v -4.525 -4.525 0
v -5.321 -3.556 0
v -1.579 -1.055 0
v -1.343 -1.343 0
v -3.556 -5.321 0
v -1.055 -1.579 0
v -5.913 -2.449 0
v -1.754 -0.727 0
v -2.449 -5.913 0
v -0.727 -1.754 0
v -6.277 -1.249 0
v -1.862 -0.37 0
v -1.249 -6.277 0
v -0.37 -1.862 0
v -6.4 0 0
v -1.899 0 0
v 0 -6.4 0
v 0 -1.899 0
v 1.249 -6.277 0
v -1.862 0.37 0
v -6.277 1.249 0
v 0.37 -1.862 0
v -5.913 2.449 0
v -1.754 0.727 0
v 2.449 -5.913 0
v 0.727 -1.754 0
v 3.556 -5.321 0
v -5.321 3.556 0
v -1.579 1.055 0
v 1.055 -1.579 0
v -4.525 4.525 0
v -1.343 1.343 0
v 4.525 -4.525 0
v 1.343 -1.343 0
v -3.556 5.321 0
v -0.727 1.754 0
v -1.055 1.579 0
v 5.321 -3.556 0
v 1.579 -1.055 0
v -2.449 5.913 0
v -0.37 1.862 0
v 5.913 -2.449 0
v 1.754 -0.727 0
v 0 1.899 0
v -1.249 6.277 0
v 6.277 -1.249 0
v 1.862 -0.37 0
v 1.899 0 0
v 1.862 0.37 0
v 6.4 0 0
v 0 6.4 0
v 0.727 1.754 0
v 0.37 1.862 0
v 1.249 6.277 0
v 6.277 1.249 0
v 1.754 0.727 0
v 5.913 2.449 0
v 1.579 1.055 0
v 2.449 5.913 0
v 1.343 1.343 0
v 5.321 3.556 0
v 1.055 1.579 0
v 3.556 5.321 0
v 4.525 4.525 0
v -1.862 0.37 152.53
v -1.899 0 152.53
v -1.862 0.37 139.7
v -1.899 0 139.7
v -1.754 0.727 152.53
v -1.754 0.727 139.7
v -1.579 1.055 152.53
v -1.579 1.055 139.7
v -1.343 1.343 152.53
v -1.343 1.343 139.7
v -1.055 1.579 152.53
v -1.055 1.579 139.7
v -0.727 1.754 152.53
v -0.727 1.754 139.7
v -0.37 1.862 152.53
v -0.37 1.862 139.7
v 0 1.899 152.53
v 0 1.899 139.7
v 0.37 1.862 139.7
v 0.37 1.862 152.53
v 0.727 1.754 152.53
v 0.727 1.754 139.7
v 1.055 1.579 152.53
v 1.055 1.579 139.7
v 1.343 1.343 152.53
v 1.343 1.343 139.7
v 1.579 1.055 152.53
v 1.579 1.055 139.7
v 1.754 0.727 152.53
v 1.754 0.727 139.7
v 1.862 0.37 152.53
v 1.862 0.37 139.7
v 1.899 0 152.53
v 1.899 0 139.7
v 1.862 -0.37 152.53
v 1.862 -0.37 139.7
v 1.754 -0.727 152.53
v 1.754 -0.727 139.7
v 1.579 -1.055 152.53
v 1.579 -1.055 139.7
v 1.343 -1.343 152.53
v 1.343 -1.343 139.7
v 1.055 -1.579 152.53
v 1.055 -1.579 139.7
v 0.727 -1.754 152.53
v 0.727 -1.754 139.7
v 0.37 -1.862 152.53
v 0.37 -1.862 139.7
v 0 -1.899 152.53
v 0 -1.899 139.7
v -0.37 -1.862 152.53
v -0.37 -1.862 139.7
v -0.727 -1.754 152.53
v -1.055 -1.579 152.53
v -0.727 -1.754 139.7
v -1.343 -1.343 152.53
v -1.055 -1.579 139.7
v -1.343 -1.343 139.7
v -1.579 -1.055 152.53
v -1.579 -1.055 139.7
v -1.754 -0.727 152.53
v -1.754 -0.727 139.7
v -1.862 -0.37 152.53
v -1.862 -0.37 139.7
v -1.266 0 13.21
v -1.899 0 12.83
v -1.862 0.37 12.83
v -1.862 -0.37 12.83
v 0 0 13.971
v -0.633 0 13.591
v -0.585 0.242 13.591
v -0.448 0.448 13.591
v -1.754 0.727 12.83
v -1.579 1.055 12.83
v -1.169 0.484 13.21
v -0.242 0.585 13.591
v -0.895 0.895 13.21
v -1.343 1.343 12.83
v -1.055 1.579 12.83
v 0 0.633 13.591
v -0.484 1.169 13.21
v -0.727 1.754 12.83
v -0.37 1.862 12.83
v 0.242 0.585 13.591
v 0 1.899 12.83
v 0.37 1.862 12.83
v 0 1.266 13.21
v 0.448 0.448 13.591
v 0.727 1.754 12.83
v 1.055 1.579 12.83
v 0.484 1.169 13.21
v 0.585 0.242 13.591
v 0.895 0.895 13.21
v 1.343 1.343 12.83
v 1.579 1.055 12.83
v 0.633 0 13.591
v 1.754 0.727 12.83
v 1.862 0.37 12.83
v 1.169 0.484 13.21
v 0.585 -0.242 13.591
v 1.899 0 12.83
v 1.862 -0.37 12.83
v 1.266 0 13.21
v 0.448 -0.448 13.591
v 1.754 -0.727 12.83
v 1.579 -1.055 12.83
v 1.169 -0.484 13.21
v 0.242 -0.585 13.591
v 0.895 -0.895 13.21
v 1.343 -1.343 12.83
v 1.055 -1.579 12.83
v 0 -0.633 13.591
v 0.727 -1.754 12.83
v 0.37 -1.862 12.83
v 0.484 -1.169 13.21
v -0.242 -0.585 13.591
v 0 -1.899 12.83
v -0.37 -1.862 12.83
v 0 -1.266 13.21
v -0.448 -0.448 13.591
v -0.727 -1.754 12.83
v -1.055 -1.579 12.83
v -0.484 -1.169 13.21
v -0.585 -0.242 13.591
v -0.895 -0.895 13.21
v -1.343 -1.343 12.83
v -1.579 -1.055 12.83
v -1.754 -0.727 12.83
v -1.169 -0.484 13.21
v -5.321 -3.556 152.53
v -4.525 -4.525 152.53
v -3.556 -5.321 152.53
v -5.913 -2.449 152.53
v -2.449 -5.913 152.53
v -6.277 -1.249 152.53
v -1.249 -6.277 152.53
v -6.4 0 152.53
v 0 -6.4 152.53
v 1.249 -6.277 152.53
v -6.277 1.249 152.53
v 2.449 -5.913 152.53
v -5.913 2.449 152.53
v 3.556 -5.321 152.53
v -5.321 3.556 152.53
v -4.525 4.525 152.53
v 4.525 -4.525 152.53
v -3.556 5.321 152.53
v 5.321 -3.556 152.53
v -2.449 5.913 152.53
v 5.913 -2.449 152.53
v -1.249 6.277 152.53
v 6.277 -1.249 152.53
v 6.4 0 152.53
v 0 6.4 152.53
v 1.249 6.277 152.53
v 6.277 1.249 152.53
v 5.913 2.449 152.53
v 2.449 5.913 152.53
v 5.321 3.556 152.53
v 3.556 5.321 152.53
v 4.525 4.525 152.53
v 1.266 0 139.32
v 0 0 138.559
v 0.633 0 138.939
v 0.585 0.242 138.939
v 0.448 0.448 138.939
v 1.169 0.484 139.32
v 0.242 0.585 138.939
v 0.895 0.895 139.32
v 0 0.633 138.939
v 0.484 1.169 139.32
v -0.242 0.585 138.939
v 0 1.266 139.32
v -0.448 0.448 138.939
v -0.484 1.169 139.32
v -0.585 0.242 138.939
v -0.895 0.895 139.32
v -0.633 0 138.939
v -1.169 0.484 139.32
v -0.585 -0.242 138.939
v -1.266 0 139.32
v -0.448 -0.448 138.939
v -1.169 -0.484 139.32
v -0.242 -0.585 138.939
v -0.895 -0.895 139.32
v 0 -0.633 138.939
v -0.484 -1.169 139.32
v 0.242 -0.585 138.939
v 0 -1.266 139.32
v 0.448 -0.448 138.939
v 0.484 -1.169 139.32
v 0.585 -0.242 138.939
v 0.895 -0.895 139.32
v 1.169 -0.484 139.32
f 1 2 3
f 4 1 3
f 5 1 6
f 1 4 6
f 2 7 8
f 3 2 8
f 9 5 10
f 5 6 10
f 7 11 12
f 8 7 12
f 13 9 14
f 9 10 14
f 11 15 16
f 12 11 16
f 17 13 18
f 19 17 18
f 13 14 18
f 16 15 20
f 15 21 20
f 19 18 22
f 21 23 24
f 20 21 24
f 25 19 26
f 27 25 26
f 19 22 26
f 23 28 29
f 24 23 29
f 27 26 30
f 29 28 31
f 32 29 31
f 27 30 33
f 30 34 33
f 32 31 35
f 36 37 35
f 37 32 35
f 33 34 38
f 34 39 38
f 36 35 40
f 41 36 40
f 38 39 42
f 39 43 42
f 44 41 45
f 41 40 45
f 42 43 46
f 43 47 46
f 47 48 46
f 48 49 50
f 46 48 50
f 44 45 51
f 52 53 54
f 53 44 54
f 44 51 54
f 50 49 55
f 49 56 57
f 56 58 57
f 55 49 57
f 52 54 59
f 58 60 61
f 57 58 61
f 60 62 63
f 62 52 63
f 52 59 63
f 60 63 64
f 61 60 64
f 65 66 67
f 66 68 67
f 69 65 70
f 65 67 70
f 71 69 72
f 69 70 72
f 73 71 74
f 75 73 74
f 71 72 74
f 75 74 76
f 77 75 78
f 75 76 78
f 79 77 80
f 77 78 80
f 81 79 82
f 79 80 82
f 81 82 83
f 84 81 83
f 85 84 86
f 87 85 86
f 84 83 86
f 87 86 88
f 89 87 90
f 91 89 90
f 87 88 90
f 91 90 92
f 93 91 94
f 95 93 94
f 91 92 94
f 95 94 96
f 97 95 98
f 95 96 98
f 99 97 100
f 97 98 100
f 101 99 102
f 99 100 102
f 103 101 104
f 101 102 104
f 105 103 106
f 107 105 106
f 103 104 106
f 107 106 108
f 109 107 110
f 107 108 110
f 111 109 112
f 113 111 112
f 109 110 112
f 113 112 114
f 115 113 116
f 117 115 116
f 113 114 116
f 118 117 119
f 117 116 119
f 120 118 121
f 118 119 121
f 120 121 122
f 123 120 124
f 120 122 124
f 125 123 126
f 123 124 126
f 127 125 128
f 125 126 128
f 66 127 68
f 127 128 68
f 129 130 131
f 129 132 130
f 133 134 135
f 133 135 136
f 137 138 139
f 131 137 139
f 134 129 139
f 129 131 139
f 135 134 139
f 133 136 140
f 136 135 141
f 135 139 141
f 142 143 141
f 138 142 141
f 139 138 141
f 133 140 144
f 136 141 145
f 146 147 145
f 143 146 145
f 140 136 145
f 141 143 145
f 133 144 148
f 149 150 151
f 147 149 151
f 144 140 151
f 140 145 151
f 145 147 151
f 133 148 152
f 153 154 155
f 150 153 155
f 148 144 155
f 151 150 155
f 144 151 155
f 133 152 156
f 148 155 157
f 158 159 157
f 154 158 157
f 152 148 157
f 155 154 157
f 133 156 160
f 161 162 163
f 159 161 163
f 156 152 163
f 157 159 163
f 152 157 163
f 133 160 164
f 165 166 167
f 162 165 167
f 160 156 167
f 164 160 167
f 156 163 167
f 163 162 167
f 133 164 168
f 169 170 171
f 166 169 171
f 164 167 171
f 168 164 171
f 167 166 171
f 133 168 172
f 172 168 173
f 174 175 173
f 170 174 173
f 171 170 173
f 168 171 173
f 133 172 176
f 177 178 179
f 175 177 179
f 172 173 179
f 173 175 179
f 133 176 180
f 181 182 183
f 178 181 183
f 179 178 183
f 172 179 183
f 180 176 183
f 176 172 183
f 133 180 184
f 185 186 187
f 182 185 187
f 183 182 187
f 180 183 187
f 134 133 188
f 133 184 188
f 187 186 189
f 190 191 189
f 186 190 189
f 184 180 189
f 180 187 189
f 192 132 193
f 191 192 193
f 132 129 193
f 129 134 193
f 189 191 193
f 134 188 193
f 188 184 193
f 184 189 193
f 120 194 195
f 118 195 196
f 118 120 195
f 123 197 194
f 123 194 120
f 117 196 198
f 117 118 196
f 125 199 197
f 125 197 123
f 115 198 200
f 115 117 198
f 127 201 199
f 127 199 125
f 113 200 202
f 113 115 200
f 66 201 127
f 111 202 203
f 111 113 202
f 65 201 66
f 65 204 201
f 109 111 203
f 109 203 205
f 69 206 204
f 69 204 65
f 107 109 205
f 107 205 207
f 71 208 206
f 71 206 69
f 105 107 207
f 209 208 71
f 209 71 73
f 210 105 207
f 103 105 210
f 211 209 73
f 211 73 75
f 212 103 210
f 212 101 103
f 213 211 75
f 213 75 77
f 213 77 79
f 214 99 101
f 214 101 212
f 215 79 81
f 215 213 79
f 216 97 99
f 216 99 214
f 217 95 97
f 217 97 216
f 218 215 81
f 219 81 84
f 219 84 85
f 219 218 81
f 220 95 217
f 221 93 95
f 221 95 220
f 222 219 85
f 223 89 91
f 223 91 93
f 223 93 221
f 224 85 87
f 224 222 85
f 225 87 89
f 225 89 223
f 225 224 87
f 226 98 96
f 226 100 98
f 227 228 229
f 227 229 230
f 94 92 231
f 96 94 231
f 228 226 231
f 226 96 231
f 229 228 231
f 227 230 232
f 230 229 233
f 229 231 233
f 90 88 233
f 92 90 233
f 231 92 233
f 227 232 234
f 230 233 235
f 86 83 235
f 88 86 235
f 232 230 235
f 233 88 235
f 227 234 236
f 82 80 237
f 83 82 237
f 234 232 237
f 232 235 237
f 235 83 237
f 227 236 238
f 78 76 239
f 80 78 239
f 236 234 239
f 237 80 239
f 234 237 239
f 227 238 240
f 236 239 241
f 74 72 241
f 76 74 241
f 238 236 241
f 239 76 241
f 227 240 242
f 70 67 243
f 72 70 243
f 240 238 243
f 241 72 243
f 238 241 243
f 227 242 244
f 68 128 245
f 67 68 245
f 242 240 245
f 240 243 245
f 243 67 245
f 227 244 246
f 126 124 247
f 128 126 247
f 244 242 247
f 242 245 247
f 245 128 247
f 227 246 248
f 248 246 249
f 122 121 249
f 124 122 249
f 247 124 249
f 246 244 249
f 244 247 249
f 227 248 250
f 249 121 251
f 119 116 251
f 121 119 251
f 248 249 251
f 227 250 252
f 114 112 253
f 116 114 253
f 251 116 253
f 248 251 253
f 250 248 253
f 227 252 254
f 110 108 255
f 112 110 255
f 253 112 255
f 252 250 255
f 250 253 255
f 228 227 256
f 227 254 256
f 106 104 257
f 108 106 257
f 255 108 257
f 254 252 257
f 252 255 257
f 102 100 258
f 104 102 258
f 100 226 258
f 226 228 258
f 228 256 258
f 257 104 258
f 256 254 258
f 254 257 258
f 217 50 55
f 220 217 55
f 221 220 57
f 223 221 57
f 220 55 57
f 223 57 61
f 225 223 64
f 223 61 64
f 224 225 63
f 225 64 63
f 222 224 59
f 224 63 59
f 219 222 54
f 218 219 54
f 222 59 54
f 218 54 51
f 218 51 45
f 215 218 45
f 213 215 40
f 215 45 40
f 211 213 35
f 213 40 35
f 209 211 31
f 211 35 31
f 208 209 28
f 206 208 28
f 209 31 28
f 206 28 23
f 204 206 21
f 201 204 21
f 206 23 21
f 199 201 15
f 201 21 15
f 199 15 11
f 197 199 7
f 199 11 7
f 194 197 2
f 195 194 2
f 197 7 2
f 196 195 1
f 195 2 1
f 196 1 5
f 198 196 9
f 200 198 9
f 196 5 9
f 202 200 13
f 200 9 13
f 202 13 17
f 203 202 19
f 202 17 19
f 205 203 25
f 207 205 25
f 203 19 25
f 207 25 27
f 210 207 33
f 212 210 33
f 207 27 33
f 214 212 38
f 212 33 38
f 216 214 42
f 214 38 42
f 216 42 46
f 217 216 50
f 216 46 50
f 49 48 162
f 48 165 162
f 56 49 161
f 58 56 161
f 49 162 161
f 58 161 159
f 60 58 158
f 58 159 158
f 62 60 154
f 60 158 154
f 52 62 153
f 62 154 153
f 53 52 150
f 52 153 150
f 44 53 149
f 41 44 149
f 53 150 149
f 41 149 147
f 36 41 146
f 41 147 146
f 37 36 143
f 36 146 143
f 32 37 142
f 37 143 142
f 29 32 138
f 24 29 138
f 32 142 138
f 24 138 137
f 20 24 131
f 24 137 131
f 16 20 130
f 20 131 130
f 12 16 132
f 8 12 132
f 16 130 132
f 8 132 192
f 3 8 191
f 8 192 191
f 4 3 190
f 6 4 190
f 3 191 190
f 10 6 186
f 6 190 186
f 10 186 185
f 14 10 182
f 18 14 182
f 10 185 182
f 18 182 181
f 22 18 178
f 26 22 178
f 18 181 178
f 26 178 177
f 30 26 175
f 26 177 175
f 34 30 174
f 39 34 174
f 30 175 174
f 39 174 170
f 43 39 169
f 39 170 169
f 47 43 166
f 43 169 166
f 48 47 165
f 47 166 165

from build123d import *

# Parameters (mm, degrees)
SKETCH1_R                  = 6.4
BOSS_EXTRUDE1_DEPTH        = 152.53
F_10_24_TAPPED_HOLE1_D     = 3.7973
F_10_24_TAPPED_HOLE1_DEPTH = 12.83
F_10_24_TAPPED_HOLE1_TIP   = 1.140824014
F_10_24_TAPPED_HOLE2_D     = 3.7973
F_10_24_TAPPED_HOLE2_DEPTH = 12.83
F_10_24_TAPPED_HOLE2_TIP   = 1.140824014


with BuildPart() as part:
    # Sketch1 → Boss-Extrude1 (new body)
    with BuildSketch(Plane.XY):
        Circle(SKETCH1_R)
    extrude(amount=BOSS_EXTRUDE1_DEPTH)

    # #10-24 Tapped Hole1
    with Locations(Plane(origin=(0, 0, 0), x_dir=(-1, 0, 0), z_dir=(0, 0, -1))):
        with Locations((0, 0)):
            Hole(F_10_24_TAPPED_HOLE1_D / 2, depth=F_10_24_TAPPED_HOLE1_DEPTH)
            with Locations((0, 0, -(F_10_24_TAPPED_HOLE1_DEPTH + F_10_24_TAPPED_HOLE1_TIP / 2))):  # 118° drill point
                Cone(0, F_10_24_TAPPED_HOLE1_D / 2, F_10_24_TAPPED_HOLE1_TIP, mode=Mode.SUBTRACT)

    # #10-24 Tapped Hole2
    with Locations(Plane.XY.offset(152.53)):
        with Locations((0, 0)):
            Hole(F_10_24_TAPPED_HOLE2_D / 2, depth=F_10_24_TAPPED_HOLE2_DEPTH)
            with Locations((0, 0, -(F_10_24_TAPPED_HOLE2_DEPTH + F_10_24_TAPPED_HOLE2_TIP / 2))):  # 118° drill point
                Cone(0, F_10_24_TAPPED_HOLE2_D / 2, F_10_24_TAPPED_HOLE2_TIP, mode=Mode.SUBTRACT)


solid = part.part
